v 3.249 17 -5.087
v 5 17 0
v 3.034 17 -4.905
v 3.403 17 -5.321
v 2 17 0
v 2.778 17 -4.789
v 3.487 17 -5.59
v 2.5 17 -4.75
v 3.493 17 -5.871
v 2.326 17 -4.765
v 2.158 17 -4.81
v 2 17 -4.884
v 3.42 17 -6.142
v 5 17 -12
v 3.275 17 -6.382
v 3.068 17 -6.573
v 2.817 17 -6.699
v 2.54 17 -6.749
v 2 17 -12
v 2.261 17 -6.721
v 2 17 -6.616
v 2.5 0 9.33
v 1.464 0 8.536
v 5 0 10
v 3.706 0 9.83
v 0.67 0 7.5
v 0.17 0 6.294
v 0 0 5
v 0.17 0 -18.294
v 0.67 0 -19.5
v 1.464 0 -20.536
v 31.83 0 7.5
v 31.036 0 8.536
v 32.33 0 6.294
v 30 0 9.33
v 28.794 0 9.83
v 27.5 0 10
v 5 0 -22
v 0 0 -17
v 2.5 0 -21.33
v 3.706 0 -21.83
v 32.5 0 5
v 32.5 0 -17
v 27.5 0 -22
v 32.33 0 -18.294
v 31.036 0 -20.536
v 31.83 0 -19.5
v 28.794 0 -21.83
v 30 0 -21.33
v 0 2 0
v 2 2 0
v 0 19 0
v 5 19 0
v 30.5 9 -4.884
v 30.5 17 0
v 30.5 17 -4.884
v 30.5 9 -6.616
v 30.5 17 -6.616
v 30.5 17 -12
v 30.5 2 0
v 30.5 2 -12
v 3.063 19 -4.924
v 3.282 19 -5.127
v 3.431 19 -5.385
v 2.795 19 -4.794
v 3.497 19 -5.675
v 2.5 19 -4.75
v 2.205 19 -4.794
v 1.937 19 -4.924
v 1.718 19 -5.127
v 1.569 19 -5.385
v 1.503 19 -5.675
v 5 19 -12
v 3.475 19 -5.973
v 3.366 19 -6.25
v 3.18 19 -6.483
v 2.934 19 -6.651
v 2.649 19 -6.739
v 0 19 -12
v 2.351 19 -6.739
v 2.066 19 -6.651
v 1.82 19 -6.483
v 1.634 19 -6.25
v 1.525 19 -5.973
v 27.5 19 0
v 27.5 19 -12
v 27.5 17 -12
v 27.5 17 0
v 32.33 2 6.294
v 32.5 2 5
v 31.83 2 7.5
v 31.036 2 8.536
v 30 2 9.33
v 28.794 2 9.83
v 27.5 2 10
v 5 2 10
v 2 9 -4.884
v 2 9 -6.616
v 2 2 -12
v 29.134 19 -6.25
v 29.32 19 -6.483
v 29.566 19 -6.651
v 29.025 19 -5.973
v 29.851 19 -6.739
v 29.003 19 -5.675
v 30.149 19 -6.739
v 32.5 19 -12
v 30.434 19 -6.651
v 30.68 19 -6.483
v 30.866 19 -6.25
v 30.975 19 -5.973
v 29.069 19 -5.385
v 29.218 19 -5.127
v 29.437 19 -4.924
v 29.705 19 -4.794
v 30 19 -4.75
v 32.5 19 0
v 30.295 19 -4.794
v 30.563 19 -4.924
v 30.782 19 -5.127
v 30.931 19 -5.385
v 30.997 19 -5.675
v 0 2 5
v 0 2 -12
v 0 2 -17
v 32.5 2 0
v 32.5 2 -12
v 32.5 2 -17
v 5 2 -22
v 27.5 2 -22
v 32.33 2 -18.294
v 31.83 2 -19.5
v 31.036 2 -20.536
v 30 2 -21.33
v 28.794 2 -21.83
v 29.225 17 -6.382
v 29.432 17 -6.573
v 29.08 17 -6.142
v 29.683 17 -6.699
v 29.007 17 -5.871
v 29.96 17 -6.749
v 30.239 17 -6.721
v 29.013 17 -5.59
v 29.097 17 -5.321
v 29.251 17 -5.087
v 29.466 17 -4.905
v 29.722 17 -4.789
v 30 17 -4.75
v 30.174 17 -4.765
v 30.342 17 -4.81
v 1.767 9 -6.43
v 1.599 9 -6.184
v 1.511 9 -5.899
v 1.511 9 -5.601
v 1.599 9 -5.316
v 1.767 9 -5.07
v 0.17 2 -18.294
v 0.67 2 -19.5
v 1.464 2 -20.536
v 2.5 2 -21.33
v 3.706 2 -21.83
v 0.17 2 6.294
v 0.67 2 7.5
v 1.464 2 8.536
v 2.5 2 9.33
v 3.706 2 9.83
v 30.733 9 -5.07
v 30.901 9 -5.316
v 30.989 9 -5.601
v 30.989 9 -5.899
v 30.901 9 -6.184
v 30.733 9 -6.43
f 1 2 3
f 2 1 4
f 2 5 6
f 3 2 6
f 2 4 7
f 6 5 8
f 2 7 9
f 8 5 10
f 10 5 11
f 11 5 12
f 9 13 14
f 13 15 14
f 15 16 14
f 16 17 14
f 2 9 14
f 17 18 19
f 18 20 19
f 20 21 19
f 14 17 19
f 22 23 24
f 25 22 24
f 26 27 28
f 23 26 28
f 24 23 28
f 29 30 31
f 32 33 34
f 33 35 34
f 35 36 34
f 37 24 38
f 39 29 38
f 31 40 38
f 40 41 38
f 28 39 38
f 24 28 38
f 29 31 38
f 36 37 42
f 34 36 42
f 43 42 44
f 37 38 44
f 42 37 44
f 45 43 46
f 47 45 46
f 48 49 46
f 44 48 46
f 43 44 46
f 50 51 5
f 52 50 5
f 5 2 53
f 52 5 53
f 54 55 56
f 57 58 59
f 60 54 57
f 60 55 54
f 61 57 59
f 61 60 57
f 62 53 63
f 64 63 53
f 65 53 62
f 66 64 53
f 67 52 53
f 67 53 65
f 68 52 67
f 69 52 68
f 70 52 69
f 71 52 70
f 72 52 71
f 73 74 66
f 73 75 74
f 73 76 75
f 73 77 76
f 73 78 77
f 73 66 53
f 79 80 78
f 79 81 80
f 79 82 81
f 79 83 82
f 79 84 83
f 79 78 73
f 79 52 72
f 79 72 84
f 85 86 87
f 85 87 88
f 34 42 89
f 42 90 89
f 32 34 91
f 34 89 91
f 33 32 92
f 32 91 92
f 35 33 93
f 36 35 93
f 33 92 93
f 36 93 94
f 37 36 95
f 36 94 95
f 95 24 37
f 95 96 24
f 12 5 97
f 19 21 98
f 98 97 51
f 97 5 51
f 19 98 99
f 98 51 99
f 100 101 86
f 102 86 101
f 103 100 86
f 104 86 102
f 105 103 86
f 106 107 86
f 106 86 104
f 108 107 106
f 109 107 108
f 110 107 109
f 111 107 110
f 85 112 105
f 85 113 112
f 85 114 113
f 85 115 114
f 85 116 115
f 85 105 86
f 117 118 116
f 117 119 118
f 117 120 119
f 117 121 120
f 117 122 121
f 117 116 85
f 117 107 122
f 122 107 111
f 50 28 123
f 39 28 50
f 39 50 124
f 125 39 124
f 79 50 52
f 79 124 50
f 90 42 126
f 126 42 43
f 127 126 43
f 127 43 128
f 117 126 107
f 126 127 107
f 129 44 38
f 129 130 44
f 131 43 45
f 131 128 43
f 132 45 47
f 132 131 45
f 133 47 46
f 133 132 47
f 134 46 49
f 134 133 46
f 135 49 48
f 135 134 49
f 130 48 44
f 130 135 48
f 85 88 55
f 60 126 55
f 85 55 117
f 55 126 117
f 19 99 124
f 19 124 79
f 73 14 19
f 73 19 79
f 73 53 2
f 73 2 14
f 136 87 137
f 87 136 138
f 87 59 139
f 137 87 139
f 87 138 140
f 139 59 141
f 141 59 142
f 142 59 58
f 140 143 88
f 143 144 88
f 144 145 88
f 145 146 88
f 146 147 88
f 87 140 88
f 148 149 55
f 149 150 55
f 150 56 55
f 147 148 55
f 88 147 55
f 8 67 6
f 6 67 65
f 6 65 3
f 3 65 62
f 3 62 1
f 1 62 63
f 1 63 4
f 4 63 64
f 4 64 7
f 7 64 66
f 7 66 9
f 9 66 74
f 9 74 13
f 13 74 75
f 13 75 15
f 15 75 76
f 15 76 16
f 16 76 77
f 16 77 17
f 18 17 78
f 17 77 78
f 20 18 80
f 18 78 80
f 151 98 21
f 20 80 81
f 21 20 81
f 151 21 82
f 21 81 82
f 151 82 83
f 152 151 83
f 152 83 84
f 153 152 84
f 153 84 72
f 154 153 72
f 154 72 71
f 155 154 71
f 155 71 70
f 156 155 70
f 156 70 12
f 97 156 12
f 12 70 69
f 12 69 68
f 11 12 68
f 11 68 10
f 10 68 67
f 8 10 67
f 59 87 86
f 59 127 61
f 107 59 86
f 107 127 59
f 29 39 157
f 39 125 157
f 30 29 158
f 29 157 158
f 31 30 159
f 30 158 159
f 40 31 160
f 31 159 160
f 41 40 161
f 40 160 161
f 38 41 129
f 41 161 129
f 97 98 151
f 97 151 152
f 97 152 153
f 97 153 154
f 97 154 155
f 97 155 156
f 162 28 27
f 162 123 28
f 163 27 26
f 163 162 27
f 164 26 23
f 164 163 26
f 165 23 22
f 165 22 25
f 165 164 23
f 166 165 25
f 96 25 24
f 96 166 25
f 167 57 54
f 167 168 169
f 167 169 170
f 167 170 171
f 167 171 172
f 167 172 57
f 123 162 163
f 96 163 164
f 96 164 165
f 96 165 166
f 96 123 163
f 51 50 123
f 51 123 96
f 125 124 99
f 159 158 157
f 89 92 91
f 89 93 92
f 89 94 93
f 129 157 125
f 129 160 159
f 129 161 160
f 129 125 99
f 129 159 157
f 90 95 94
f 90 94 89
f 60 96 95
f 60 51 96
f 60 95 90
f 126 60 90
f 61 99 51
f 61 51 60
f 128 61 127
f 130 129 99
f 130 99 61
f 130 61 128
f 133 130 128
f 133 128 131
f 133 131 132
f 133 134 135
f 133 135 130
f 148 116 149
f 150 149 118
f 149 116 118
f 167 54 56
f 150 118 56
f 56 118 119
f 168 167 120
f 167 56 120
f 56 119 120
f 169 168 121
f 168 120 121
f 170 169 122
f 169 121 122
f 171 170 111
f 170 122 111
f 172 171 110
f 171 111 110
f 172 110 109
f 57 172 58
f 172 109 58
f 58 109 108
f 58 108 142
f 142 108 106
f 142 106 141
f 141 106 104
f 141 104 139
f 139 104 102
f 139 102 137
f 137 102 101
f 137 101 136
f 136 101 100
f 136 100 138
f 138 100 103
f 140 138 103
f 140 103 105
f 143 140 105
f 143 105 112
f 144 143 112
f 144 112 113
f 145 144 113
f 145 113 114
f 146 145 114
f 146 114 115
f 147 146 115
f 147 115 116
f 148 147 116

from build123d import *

# Parameters (mm, degrees)
SKETCH1_W           = 32.5
SKETCH1_H           = 12
BOSS_EXTRUDE1_DEPTH = 2
SKETCH2_W           = 2
SKETCH2_H           = 12
BOSS_EXTRUDE2_DEPTH = 17
SKETCH3_W           = 12
SKETCH3_H           = 2
BOSS_EXTRUDE3_DEPTH = 3
SKETCH4_W           = 12
SKETCH4_H           = 2
BOSS_EXTRUDE4_DEPTH = 3
SKETCH5_W           = 32.5
SKETCH5_H           = 2
BOSS_EXTRUDE6_DEPTH = 10
SKETCH7_W           = 32.5
SKETCH7_H           = 2
BOSS_EXTRUDE7_DEPTH = 10
FILLET1_R           = 5
SKETCH8_R           = 1
CUT_EXTRUDE1_DEPTH  = 10


with BuildPart() as part:
    # Sketch1 → Boss-Extrude1 (new body)
    with BuildSketch(Plane(origin=(0, 0, 0), x_dir=(1, 0, 0), z_dir=(0, 1, 0))):
        with Locations((16.25, 6)):
            Rectangle(SKETCH1_W, SKETCH1_H)
    extrude(amount=BOSS_EXTRUDE1_DEPTH)

    # Sketch2 → Boss-Extrude2 (add)
    with BuildSketch(Plane(origin=(0, 2, 0), x_dir=(1, 0, 0), z_dir=(0, 1, 0))):
        with Locations((1, 6)):
            Rectangle(SKETCH2_W, SKETCH2_H)
        with Locations((31.5, 6)):
            Rectangle(SKETCH2_W, SKETCH2_H)
    extrude(amount=BOSS_EXTRUDE2_DEPTH)

    # Sketch3 → Boss-Extrude3 (add)
    with BuildSketch(Plane(origin=(2, 0, 0), x_dir=(0, 0, -1), z_dir=(1, 0, 0))):
        with Locations((6, 18)):
            Rectangle(SKETCH3_W, SKETCH3_H)
    extrude(amount=BOSS_EXTRUDE3_DEPTH)

    # Sketch4 → Boss-Extrude4 (add)
    with BuildSketch(Plane.ZY.offset(-30.5)):
        with Locations((-6, 18)):
            Rectangle(SKETCH4_W, SKETCH4_H)
    extrude(amount=BOSS_EXTRUDE4_DEPTH)

    # Sketch5 → Boss-Extrude6 (add)
    with BuildSketch(Plane(origin=(0, 0, -12), x_dir=(-1, 0, 0), z_dir=(0, 0, -1))):
        with Locations((-16.25, 1)):
            Rectangle(SKETCH5_W, SKETCH5_H)
    extrude(amount=BOSS_EXTRUDE6_DEPTH)

    # Sketch7 → Boss-Extrude7 (add)
    with BuildSketch(Plane.XY):
        with Locations((16.25, 1)):
            Rectangle(SKETCH7_W, SKETCH7_H)
    extrude(amount=BOSS_EXTRUDE7_DEPTH)

    # Fillet1
    fillet1_edges = [part.edges().sort_by_distance(p)[0] for p in [
        (32.5, 1, 10),
        (0, 1, 10),
        (32.5, 1, -22),
        (0, 1, -22),
    ]]
    fillet(fillet1_edges, radius=FILLET1_R)

    # Sketch8 → Cut-Extrude1 (cut)
    with BuildSketch(Plane(origin=(0, 19, 0), x_dir=(1, 0, 0), z_dir=(0, 1, 0))):
        with Locations(Location((2.5, 5.75, 0), (0, 0, 270))):
            Circle(SKETCH8_R)
        with Locations(Location((30, 5.75, 0), (0, 0, 270))):
            Circle(SKETCH8_R)
    extrude(amount=-CUT_EXTRUDE1_DEPTH, mode=Mode.SUBTRACT)


solid = part.part
